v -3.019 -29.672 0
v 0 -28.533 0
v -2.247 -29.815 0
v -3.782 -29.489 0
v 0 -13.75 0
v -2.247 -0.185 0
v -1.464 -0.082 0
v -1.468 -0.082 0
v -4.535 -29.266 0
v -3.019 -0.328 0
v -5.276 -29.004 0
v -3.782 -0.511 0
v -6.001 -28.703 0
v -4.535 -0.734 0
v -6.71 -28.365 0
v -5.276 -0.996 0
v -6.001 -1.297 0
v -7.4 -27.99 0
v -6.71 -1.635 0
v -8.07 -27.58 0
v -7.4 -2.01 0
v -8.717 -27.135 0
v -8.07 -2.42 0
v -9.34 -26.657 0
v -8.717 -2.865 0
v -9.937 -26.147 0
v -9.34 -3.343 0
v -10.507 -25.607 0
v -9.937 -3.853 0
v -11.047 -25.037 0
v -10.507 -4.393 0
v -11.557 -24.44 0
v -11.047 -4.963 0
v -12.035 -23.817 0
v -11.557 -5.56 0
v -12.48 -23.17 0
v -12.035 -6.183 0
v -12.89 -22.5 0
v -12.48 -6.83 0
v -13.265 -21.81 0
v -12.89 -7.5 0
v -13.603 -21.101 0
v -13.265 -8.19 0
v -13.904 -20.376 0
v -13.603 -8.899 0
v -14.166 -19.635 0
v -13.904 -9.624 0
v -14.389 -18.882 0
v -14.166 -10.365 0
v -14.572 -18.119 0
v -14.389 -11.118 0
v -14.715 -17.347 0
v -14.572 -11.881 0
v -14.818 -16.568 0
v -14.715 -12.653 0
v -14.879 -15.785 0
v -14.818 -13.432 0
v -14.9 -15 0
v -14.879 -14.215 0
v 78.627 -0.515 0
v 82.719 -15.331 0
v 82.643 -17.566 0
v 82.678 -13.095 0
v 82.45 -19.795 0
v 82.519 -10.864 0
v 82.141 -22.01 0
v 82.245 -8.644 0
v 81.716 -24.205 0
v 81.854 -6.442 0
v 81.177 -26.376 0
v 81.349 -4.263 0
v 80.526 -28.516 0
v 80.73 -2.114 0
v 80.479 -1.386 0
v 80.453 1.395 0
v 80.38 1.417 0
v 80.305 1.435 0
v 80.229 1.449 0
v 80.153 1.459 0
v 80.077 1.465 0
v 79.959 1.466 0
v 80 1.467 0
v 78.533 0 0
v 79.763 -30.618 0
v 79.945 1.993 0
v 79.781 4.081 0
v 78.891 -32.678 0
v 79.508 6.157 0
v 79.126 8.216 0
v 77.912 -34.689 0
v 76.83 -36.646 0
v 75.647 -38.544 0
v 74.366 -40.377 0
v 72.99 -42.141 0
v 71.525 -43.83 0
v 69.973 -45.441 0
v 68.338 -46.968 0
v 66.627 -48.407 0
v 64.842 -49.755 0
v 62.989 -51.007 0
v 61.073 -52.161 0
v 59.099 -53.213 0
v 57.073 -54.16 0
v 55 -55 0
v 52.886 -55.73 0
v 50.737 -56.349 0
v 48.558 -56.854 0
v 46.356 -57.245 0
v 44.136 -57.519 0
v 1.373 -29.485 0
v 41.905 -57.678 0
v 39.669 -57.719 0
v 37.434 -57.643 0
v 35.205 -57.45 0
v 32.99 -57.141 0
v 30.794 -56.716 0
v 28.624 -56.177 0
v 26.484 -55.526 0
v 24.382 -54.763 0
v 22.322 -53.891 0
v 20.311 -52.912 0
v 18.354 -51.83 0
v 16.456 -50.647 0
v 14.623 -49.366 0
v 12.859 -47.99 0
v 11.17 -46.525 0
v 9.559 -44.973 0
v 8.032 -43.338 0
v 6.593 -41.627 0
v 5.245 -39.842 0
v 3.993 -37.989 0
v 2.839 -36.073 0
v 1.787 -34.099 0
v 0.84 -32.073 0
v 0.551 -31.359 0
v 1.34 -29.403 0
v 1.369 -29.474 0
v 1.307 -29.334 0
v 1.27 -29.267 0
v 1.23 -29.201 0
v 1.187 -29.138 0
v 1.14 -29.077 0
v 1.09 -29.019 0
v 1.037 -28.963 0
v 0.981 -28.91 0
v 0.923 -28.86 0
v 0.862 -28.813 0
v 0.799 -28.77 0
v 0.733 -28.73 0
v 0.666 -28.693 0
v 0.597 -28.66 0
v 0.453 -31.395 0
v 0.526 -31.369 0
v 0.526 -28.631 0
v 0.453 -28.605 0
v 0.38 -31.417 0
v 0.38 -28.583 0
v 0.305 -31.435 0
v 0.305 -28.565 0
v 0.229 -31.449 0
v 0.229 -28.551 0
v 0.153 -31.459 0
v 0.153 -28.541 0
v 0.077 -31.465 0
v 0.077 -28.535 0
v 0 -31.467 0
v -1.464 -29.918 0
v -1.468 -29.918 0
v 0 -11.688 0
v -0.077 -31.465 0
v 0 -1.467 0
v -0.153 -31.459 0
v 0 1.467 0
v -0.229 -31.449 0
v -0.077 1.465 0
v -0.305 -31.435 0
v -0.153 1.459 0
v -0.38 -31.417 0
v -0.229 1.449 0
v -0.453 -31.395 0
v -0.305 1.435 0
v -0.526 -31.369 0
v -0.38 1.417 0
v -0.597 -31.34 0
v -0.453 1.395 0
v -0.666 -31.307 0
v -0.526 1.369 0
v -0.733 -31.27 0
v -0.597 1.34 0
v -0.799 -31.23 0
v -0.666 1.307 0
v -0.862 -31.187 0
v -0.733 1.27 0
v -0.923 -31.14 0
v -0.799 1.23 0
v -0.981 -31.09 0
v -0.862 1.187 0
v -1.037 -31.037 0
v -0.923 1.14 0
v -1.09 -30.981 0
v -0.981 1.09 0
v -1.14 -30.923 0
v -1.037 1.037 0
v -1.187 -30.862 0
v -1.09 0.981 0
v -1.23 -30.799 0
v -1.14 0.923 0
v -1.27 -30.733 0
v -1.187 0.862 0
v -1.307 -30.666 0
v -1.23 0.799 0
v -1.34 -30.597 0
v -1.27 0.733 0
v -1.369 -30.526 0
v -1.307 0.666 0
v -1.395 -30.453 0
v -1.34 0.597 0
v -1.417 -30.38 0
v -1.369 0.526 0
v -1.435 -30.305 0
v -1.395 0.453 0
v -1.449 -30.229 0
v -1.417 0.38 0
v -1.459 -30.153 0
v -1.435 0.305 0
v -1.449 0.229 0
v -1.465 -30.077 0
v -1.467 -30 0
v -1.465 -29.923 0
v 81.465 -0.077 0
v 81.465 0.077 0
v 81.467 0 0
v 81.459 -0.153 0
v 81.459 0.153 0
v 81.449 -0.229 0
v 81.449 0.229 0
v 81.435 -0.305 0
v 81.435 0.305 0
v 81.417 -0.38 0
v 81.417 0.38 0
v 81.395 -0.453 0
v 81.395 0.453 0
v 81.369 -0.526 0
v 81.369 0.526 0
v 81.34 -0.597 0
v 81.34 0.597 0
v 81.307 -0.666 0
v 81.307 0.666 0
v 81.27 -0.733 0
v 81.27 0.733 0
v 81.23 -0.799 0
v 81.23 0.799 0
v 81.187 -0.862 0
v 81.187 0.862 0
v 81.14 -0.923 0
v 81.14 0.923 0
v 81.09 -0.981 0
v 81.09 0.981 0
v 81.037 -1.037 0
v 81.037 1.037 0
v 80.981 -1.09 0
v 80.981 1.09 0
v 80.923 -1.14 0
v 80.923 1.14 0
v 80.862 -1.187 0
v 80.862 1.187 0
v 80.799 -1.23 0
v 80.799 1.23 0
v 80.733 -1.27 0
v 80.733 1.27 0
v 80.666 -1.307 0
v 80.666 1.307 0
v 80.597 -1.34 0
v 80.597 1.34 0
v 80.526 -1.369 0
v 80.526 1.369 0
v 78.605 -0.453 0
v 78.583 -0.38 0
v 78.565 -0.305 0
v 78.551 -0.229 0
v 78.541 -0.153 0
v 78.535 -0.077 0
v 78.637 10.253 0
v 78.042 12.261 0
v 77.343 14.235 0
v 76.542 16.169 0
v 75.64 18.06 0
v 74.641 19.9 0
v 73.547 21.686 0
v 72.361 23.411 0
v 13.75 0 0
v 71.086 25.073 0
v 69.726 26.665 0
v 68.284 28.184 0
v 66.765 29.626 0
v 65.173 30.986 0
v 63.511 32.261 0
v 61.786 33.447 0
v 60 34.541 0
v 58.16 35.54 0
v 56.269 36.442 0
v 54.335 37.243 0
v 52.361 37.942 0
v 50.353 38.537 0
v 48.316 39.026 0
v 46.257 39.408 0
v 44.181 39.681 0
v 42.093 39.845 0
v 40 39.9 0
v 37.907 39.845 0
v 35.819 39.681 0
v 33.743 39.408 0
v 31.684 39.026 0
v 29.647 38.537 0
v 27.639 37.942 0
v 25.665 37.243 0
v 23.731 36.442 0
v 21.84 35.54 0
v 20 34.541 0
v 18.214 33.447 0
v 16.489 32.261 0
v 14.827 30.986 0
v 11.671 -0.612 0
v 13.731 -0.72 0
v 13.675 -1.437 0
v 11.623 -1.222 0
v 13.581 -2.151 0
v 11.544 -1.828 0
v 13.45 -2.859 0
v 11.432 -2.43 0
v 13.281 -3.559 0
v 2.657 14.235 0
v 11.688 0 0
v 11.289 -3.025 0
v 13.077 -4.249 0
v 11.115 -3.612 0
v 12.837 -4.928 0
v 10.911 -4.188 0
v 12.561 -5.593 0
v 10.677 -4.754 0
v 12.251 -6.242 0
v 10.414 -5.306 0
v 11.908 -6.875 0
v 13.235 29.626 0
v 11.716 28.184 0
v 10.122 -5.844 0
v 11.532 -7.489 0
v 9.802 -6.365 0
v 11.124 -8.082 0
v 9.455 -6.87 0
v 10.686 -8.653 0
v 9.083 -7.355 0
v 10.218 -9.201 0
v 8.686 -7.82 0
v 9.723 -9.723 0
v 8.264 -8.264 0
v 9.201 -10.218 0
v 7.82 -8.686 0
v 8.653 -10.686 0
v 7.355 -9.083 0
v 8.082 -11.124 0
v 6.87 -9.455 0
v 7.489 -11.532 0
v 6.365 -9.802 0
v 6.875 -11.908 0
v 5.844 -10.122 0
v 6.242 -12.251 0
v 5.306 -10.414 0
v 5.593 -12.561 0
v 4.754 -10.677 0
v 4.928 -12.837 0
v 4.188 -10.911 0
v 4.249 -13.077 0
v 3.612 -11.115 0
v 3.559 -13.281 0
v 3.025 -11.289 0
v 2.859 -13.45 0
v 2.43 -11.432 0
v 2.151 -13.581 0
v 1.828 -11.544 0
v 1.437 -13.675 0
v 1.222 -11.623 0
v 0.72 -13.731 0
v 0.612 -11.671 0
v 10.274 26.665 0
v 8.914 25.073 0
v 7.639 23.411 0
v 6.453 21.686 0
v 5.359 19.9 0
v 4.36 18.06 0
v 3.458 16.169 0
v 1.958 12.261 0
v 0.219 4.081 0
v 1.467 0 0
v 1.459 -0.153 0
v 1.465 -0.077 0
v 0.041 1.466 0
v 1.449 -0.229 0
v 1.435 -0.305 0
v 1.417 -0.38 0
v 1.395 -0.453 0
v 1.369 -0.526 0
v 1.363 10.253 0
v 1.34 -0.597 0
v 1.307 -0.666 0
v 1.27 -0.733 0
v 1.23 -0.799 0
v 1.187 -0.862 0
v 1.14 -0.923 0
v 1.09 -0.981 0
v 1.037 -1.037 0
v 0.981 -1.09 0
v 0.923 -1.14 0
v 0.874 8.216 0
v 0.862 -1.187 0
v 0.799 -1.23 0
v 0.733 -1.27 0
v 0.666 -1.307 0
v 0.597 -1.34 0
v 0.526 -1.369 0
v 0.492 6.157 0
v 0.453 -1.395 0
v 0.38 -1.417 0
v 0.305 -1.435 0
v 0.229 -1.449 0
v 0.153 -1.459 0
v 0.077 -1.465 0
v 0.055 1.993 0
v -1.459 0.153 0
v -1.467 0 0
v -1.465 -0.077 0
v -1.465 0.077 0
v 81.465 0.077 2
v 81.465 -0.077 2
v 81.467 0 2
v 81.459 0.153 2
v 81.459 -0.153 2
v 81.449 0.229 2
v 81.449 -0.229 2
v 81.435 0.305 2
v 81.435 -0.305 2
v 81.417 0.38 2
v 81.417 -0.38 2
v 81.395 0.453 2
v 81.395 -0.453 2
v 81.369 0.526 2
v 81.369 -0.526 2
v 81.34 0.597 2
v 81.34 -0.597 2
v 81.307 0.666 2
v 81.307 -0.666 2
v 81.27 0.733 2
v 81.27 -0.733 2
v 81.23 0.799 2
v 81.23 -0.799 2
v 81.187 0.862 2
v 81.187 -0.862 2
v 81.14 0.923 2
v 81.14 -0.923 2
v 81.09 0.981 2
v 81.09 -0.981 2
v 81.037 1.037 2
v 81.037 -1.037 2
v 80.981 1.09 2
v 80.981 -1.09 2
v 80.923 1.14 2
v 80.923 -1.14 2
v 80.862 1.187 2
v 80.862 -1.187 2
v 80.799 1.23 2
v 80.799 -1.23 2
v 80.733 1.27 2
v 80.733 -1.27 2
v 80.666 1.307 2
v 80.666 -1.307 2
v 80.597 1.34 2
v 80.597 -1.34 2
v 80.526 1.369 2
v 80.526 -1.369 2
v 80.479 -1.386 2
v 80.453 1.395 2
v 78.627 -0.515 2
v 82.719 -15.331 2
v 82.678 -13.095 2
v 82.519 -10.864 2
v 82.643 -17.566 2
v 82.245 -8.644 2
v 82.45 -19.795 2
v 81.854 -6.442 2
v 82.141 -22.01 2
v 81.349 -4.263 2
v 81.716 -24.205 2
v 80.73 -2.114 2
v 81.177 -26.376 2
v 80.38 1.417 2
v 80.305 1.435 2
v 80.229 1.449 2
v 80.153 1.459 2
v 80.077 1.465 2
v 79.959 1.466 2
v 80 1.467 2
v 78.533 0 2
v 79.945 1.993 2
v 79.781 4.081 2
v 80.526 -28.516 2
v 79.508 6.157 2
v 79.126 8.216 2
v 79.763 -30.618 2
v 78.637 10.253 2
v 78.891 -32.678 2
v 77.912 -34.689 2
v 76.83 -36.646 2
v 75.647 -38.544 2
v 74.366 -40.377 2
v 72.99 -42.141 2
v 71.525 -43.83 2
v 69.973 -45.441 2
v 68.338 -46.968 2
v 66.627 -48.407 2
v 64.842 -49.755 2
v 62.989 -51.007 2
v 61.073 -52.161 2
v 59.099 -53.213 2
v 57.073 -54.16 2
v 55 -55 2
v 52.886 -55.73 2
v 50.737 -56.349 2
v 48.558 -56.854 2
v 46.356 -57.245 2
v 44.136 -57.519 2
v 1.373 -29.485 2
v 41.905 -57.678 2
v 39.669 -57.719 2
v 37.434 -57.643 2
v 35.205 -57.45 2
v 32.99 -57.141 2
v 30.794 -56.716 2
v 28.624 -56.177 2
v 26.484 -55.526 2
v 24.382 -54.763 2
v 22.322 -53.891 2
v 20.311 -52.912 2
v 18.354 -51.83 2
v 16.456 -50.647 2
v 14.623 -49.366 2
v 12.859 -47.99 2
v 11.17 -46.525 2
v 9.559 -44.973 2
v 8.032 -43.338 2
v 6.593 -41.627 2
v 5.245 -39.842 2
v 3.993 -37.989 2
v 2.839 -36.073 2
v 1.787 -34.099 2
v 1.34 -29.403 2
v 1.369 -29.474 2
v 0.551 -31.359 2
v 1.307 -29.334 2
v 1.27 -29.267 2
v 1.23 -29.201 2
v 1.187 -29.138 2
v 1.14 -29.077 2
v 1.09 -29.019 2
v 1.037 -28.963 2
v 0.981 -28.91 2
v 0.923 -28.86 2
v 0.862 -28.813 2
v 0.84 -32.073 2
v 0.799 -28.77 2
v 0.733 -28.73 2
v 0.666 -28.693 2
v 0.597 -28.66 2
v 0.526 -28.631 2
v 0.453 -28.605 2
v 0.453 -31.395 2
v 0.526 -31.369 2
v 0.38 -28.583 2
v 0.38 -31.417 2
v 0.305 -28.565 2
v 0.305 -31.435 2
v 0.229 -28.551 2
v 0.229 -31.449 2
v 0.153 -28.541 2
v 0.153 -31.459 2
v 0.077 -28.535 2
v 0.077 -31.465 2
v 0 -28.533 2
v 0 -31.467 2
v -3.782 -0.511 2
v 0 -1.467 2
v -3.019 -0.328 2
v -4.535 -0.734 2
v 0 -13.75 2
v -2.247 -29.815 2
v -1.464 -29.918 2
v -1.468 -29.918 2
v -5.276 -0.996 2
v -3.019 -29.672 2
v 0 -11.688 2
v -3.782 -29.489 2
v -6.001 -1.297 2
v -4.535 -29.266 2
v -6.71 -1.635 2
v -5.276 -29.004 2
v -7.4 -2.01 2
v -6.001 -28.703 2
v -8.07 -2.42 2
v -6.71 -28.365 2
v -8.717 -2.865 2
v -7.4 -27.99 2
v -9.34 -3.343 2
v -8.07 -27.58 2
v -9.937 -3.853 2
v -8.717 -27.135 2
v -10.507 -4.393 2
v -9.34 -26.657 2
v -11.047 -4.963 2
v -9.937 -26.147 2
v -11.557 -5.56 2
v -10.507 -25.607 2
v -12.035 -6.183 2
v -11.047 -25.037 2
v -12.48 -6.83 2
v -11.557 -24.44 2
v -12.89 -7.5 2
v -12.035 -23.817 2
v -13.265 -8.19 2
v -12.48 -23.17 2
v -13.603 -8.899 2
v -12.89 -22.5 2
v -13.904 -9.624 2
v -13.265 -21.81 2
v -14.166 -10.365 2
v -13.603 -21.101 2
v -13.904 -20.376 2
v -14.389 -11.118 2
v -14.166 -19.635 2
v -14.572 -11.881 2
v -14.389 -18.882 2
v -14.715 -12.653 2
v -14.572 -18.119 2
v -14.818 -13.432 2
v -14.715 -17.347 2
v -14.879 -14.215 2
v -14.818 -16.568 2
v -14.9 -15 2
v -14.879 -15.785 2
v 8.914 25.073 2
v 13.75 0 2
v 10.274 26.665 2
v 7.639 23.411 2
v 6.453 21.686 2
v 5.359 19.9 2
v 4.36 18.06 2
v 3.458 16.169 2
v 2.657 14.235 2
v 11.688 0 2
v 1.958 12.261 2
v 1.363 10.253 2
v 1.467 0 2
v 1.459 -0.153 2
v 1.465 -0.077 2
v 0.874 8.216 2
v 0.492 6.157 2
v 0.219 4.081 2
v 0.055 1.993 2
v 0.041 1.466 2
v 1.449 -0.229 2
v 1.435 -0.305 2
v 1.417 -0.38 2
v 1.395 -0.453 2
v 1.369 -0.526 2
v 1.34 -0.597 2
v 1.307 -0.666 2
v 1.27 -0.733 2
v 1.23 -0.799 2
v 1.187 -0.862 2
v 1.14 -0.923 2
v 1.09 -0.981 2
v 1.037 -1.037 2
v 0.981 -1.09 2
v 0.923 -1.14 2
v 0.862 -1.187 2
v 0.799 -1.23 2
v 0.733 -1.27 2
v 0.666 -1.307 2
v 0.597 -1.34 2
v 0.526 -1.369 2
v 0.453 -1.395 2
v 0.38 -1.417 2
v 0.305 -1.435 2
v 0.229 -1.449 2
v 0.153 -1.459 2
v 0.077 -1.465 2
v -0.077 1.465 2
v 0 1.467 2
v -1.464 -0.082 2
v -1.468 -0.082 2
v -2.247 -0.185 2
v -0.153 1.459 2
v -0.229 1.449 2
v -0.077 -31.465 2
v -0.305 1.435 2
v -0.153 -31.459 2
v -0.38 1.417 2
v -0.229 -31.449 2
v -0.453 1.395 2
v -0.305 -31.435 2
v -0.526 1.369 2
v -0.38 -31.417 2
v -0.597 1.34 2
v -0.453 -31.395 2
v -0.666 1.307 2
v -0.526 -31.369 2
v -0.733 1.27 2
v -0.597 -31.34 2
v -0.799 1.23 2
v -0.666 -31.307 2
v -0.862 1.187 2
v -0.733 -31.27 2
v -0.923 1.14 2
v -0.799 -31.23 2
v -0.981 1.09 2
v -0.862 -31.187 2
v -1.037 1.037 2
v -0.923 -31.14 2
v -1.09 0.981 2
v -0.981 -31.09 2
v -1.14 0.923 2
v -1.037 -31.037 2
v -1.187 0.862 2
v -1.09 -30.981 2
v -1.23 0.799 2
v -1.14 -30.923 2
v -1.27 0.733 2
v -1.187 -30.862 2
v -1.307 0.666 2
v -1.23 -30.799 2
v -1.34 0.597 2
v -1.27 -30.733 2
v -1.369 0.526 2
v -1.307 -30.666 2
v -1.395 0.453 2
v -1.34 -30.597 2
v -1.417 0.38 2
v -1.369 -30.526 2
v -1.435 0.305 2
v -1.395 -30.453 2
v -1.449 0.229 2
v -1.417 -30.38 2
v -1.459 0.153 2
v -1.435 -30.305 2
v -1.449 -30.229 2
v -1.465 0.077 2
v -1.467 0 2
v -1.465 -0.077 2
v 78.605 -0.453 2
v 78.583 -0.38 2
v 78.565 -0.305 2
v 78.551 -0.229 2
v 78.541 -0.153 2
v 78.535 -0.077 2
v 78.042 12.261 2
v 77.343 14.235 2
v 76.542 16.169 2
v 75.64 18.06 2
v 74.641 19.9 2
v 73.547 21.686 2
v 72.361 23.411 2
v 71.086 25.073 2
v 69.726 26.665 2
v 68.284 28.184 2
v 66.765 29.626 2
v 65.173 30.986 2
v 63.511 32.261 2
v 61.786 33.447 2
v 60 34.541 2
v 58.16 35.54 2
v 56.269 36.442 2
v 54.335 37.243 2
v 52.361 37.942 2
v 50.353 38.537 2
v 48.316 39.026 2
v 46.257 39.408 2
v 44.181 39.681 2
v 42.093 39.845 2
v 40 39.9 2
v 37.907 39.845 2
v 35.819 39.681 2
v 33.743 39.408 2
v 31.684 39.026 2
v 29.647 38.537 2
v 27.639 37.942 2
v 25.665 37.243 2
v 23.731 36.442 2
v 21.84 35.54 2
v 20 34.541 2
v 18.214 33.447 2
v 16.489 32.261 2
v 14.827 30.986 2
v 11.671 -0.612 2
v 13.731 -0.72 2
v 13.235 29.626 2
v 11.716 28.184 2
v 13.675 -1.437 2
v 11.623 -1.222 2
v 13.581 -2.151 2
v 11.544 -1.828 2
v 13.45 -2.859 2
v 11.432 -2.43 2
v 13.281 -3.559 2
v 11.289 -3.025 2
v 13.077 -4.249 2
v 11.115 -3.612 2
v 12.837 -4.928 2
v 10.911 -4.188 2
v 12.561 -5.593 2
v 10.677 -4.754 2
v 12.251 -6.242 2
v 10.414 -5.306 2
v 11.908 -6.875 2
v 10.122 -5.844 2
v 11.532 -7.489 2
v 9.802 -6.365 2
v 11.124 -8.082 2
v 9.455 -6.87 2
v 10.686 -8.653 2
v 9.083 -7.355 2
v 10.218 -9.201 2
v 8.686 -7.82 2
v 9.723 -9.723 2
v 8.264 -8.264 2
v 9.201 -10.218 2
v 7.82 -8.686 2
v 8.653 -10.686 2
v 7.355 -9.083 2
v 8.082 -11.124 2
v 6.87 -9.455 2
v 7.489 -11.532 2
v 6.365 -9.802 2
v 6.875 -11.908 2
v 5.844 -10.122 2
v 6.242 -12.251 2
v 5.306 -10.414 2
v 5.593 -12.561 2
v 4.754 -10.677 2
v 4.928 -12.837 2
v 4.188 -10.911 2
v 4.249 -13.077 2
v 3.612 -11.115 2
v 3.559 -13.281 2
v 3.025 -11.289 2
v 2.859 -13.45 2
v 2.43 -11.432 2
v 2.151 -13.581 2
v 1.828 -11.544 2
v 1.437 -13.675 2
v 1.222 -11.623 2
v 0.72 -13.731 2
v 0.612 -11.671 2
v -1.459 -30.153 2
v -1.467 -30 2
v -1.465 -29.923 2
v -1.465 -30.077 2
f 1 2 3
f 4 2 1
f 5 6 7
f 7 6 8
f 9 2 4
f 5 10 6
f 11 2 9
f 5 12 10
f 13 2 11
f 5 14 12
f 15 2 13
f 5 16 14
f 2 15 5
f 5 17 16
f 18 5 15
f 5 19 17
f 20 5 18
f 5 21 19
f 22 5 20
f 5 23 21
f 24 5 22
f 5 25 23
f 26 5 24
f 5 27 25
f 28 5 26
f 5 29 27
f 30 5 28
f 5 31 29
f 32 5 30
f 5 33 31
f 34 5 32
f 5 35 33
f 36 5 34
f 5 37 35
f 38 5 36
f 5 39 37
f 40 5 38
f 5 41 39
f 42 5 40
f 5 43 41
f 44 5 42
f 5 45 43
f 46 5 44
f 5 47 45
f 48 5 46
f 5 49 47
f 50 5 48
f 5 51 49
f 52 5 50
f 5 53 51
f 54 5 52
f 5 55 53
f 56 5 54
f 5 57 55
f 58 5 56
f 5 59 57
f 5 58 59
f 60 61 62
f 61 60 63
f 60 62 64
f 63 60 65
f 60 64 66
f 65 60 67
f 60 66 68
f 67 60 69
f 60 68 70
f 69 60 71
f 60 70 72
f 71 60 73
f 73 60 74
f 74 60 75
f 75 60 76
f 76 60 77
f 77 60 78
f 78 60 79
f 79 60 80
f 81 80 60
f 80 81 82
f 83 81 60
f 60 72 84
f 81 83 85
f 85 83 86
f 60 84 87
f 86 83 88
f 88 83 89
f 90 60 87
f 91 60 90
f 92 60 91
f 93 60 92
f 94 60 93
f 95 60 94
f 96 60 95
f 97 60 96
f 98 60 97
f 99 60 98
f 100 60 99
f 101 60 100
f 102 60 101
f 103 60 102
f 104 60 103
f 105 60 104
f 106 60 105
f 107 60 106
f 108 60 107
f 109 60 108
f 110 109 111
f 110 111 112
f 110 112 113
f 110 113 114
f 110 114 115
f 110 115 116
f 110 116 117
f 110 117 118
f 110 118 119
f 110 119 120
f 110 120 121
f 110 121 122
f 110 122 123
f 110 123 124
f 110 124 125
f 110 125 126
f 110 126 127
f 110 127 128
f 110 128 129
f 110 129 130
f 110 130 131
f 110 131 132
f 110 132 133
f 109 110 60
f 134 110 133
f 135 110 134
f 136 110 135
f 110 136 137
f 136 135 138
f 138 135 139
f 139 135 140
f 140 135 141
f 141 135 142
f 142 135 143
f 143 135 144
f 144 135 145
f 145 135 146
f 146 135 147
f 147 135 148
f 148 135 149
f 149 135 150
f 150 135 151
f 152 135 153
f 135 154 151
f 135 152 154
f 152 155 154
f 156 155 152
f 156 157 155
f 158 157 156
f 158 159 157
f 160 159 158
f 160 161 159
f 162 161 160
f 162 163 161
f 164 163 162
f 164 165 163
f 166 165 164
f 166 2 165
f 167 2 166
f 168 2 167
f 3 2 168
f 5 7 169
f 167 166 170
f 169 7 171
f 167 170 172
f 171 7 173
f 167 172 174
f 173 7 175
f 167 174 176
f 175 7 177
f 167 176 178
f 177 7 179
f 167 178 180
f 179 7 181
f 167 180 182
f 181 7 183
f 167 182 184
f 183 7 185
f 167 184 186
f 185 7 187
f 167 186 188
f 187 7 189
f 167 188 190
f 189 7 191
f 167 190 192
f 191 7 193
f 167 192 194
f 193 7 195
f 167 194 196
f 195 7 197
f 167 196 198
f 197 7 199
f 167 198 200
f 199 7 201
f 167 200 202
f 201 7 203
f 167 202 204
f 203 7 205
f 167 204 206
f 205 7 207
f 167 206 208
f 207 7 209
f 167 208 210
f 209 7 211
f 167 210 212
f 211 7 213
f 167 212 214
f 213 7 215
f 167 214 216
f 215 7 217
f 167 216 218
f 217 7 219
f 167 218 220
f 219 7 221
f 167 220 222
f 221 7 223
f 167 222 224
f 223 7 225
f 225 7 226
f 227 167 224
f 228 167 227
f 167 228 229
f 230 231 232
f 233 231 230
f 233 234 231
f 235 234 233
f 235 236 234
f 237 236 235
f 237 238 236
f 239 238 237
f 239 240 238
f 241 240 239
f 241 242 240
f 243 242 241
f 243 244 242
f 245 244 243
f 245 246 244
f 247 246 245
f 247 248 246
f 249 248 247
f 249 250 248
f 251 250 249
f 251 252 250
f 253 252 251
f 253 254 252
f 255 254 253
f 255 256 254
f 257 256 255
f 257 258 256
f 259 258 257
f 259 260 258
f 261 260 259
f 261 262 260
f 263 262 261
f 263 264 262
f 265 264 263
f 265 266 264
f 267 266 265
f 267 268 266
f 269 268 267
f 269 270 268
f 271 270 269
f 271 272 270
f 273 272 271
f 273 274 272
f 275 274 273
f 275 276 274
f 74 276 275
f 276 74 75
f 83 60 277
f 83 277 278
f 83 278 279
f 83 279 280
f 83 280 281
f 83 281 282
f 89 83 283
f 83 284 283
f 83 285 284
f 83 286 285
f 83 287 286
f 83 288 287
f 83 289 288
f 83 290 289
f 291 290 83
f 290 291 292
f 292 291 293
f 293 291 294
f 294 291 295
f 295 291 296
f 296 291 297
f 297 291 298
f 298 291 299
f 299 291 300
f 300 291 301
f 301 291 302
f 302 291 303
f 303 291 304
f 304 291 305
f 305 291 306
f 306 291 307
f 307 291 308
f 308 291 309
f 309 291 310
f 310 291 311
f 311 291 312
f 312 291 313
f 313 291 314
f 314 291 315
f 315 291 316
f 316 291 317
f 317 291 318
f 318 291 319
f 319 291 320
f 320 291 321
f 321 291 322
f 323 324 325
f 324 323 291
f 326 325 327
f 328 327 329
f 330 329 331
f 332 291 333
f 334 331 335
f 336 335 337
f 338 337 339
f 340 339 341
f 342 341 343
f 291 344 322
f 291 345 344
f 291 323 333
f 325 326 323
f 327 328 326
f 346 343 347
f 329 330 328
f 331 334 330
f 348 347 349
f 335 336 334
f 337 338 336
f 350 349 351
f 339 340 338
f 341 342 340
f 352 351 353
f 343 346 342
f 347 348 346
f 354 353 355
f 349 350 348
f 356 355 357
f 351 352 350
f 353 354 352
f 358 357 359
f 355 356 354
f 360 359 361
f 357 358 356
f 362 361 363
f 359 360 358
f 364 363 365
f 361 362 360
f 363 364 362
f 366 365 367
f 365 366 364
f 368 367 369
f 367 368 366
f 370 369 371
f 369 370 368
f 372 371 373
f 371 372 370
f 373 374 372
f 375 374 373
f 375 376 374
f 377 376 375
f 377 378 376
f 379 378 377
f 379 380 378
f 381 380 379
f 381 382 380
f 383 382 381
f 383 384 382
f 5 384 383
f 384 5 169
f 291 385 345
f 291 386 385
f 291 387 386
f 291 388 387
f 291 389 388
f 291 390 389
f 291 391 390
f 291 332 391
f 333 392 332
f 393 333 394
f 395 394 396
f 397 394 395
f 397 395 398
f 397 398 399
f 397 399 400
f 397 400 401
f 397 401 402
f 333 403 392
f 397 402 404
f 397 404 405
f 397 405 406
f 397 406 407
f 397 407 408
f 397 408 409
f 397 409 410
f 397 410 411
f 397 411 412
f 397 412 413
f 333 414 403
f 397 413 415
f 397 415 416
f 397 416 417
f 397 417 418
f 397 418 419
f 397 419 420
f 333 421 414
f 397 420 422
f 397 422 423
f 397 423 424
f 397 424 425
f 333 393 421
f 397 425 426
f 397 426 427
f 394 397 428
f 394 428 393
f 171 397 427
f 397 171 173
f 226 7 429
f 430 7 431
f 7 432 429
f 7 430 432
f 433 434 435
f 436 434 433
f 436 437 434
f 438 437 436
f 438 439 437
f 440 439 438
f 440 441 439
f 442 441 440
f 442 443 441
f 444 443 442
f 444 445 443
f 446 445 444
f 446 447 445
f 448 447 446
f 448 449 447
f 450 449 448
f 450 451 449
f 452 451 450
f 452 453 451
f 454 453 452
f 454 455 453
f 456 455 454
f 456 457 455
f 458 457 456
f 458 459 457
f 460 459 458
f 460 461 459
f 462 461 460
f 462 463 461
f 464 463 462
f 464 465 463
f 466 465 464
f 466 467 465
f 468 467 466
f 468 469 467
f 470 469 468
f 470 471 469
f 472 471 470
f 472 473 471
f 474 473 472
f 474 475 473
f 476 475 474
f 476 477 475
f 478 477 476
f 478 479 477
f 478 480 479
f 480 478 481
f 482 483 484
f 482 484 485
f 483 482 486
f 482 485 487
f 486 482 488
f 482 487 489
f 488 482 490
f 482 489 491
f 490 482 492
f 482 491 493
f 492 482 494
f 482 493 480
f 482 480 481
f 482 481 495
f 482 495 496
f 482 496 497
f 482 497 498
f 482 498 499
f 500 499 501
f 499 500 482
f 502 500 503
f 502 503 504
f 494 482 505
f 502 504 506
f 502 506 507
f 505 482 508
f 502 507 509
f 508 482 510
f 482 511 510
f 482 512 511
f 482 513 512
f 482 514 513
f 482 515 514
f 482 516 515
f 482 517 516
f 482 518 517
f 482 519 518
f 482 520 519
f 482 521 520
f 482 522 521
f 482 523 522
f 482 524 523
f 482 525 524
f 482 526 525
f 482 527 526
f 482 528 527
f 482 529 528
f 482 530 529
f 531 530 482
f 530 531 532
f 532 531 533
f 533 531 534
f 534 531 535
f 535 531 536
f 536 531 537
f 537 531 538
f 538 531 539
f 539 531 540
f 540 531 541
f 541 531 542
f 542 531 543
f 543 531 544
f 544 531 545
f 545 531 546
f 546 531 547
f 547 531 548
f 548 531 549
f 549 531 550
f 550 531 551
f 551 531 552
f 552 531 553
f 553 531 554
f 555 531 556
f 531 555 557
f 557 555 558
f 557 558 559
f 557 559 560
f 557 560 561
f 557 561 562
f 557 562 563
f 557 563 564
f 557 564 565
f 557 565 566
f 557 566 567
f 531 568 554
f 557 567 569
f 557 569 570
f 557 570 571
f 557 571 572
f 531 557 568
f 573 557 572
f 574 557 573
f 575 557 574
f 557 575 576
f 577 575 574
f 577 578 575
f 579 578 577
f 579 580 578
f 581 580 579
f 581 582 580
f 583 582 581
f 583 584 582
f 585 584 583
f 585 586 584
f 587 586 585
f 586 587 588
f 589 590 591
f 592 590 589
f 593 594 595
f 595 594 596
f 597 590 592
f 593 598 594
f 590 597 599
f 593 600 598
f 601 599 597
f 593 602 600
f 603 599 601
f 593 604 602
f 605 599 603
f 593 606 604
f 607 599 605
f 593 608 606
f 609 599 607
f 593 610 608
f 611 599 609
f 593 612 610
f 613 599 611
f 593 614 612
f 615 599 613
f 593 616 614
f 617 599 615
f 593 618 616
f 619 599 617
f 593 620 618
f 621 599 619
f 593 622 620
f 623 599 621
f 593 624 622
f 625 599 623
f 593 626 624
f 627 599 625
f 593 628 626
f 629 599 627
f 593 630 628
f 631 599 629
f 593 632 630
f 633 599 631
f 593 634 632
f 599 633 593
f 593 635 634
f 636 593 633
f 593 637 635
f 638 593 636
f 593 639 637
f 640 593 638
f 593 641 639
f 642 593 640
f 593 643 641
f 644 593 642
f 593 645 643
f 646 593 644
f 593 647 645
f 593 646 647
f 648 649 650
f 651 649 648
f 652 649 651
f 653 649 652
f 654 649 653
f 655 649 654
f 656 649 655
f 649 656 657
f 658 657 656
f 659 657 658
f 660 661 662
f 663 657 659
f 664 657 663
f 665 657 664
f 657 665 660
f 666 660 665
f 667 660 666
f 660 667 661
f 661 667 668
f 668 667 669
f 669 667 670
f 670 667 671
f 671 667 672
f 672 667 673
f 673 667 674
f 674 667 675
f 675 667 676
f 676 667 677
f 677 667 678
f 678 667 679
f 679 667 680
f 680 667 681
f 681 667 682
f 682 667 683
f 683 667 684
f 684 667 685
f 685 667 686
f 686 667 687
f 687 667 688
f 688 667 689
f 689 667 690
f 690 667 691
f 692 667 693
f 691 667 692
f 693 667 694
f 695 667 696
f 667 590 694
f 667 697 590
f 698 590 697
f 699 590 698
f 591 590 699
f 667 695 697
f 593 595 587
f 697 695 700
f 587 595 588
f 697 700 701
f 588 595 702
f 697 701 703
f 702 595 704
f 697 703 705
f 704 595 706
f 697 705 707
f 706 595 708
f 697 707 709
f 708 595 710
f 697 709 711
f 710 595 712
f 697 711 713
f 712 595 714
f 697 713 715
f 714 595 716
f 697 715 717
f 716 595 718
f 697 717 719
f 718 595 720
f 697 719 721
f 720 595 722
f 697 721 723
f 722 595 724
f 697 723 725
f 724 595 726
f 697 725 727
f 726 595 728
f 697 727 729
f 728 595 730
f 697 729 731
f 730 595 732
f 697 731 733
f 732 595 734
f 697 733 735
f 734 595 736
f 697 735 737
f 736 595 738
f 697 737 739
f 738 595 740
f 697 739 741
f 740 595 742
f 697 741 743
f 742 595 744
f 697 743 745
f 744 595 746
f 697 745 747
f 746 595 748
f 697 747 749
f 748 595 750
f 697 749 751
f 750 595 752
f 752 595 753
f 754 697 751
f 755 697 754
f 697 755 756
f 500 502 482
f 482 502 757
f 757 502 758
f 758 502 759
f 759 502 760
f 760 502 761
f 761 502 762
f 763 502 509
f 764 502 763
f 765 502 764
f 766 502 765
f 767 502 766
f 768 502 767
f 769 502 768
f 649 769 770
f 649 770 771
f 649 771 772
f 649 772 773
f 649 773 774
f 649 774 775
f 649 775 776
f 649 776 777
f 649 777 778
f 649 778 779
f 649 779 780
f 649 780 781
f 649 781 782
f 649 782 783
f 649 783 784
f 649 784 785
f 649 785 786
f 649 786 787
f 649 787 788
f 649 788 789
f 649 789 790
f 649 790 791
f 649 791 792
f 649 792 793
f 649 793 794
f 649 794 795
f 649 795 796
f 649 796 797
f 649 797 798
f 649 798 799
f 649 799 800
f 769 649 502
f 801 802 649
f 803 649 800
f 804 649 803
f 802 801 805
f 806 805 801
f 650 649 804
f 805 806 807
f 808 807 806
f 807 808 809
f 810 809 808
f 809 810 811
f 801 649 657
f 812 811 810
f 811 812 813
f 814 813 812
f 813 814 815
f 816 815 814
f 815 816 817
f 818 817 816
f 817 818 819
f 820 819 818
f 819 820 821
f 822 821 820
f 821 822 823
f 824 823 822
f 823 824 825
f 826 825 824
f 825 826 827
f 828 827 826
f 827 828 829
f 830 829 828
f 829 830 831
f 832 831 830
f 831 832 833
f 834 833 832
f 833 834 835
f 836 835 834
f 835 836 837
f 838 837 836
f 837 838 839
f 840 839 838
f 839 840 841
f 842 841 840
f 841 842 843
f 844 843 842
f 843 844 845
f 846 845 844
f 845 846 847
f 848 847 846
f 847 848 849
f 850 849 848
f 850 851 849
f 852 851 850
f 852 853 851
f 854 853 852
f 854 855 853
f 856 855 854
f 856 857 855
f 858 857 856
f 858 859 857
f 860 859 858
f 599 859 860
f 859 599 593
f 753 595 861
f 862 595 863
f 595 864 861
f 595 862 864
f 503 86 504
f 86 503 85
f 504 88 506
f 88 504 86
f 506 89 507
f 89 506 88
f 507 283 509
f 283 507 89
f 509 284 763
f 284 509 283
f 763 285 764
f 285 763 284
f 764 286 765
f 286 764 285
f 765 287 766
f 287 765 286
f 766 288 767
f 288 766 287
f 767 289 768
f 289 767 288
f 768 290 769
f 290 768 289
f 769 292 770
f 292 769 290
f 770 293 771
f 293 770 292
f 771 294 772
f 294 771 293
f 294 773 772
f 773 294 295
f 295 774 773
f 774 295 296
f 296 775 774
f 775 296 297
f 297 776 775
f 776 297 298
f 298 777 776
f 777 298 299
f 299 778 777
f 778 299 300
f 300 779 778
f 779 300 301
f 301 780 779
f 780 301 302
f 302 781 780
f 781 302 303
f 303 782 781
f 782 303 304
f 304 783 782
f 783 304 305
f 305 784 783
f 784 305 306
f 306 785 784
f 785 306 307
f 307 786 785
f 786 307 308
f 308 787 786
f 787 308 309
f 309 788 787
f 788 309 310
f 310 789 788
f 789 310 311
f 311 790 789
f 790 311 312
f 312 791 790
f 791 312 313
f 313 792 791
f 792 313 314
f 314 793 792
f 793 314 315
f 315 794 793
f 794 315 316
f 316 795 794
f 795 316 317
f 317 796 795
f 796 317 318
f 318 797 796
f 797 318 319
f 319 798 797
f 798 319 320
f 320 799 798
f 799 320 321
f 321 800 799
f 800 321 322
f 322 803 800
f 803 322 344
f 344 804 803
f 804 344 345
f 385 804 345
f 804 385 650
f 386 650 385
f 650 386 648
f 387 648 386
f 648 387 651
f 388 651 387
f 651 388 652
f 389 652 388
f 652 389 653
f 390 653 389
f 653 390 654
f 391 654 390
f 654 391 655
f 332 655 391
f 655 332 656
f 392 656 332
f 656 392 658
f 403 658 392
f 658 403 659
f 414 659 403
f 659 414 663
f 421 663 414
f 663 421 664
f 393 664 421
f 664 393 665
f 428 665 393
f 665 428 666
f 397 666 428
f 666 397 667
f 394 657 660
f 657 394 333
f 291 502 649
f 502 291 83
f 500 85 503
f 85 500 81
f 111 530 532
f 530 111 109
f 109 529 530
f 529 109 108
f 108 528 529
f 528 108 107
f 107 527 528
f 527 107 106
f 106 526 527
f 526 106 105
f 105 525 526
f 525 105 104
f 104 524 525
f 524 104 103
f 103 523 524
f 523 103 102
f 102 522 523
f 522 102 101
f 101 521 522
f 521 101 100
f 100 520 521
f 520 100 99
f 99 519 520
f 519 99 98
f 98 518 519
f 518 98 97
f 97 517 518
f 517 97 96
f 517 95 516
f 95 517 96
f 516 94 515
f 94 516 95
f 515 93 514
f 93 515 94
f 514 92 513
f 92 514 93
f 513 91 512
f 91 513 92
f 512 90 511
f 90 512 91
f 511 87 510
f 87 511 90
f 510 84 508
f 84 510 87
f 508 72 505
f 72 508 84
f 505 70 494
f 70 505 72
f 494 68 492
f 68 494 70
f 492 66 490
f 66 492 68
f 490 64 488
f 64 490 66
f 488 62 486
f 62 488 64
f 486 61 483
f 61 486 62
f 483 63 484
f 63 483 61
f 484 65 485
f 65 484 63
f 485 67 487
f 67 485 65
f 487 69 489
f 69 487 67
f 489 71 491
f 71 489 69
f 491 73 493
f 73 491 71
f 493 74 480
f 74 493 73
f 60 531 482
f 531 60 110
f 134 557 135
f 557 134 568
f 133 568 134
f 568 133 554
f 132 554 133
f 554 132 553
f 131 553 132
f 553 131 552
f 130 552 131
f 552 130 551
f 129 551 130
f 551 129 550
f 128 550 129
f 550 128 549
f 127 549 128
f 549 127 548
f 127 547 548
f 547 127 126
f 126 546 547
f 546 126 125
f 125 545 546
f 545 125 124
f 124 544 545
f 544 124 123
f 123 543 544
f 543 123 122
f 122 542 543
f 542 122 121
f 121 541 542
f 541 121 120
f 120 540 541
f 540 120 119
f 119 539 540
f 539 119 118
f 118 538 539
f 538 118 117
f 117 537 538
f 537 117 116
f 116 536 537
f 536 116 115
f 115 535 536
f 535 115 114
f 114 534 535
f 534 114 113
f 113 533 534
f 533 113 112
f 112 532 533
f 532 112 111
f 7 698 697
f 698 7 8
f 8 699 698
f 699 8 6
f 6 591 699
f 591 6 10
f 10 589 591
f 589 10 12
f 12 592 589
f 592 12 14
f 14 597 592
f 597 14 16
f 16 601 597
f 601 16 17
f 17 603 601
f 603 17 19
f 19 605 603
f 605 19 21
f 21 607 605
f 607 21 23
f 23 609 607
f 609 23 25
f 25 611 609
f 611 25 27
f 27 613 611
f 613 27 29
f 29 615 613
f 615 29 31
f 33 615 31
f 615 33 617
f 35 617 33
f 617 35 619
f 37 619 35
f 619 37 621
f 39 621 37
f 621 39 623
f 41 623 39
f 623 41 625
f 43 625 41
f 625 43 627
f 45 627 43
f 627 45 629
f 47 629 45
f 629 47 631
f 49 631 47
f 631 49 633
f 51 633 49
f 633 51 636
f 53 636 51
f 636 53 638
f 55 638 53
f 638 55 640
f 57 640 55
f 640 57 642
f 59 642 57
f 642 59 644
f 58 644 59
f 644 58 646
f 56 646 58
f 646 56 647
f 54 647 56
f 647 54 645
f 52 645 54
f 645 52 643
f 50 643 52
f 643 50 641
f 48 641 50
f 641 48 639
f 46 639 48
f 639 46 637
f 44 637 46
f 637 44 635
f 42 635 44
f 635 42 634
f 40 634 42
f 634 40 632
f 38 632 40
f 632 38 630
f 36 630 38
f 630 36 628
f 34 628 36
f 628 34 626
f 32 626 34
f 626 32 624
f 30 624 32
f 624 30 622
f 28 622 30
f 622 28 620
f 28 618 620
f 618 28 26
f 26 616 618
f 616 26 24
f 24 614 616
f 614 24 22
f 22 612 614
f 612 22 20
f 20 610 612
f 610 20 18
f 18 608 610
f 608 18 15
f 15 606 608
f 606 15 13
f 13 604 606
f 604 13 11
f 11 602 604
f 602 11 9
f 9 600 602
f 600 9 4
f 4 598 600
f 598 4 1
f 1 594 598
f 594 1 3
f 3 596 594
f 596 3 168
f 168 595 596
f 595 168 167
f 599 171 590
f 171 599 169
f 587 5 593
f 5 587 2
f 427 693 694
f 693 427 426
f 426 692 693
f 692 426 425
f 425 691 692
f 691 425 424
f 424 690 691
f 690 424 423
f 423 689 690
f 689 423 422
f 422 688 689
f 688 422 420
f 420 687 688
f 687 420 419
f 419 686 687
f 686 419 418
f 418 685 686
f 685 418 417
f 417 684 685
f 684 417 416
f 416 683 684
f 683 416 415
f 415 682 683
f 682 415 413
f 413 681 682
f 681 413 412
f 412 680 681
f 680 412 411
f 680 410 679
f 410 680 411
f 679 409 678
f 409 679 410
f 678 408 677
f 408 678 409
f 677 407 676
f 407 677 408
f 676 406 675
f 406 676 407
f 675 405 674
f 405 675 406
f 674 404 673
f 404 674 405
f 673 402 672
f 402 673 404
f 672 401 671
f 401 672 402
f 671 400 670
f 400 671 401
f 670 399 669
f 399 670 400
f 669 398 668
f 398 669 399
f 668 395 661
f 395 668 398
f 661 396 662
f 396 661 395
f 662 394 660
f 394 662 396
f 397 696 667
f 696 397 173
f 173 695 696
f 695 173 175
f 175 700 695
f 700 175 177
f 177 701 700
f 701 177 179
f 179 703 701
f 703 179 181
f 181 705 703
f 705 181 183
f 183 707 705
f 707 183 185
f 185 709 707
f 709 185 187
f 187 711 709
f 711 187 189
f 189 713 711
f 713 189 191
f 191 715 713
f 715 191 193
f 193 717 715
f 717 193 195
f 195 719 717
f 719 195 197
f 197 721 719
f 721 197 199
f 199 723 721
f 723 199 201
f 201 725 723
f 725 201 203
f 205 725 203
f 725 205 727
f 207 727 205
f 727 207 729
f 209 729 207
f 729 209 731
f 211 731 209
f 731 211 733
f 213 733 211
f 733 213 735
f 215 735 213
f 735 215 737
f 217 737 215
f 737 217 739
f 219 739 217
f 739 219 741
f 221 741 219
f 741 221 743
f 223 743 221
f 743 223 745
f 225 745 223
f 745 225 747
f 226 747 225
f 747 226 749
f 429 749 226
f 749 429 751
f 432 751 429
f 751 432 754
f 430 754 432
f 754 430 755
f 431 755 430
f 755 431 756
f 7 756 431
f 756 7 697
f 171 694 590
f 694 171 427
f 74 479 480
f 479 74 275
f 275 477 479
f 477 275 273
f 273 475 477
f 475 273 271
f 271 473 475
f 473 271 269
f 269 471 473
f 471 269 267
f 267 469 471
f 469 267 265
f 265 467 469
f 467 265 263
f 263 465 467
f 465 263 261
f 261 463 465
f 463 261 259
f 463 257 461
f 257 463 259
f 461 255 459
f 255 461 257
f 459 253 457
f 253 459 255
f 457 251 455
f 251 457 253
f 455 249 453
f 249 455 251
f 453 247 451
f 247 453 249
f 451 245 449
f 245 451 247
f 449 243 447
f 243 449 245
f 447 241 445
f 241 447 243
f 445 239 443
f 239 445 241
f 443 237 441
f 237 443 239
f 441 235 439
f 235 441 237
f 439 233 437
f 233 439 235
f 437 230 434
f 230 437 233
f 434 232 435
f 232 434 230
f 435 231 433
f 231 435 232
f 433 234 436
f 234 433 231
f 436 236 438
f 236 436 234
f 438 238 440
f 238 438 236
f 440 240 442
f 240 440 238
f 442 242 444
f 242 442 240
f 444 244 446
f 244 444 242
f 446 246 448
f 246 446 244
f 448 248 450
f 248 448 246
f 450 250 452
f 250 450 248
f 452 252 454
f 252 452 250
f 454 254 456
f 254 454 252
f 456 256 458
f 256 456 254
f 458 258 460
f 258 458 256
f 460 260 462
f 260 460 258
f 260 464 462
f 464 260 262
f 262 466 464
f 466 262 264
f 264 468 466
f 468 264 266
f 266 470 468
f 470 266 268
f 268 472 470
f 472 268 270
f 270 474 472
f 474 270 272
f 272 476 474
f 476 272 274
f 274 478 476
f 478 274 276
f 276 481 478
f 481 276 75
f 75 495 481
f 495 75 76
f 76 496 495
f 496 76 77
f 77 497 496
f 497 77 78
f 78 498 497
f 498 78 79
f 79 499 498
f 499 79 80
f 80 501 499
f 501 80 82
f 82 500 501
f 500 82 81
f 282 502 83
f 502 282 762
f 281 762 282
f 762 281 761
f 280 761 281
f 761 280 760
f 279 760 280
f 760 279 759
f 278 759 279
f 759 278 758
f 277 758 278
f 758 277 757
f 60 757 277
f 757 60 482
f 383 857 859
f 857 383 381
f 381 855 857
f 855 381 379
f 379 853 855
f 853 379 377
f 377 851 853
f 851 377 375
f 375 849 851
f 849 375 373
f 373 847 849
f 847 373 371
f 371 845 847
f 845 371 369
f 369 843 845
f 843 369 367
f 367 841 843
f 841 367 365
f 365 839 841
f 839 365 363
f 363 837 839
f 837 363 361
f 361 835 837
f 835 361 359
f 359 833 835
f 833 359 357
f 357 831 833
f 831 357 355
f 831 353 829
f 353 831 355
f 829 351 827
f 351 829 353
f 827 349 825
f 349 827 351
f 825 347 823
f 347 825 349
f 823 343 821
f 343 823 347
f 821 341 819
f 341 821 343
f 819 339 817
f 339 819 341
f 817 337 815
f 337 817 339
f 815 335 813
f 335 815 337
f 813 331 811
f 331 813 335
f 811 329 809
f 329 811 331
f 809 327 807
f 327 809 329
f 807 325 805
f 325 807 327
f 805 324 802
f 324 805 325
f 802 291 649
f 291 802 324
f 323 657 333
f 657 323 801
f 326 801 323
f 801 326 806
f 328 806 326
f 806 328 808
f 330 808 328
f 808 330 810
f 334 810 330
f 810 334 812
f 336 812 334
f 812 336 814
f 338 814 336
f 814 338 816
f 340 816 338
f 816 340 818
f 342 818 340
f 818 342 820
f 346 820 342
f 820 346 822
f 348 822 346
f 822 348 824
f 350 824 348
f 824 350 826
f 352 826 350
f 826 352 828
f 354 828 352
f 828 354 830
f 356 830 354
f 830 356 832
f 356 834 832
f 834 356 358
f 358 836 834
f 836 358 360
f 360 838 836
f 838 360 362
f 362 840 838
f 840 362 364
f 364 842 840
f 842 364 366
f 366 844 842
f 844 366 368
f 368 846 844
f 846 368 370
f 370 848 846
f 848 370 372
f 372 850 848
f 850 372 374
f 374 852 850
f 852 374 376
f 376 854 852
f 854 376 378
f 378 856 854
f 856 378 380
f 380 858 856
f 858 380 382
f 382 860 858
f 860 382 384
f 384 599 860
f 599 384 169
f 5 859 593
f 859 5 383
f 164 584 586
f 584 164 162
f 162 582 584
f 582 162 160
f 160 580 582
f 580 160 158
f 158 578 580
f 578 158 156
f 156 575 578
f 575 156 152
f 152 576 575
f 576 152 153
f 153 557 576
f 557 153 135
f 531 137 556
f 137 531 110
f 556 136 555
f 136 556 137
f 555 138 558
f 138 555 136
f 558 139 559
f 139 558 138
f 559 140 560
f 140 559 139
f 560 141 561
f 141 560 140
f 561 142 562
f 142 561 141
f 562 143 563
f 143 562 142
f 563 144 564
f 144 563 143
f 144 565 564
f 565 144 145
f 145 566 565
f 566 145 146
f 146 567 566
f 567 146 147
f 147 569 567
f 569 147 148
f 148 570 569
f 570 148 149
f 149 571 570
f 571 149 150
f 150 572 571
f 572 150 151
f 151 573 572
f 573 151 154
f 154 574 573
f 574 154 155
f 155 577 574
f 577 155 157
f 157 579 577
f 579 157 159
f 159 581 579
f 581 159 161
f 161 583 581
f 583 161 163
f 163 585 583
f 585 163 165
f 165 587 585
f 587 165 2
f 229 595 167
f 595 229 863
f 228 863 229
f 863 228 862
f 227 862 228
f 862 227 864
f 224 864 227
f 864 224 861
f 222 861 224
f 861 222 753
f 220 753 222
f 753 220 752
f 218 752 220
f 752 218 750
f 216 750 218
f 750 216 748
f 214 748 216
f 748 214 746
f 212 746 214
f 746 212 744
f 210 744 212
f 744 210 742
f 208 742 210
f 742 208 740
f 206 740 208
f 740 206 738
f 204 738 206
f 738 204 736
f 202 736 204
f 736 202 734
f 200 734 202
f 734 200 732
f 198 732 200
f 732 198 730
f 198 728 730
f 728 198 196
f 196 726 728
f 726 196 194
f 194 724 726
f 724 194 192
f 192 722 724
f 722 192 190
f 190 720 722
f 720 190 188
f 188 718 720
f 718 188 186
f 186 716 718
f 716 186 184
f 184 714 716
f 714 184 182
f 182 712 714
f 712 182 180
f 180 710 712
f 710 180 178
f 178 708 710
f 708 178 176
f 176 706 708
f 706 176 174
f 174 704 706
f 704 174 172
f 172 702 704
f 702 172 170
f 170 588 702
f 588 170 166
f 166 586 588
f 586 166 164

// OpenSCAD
// Pythagoras Thing
// Version 1.0
// Luigi Cisana, 22 Jan, 2014

// Leg a
leg_a=80; // [20:120]
// Leq b
leg_b=30; // [20:120]
// Height
heigth = 2; // [1:120]

// Number of facets, set a low value for a draft version
fn = 120; // [30:200]

/* [Hidden] */
a = leg_a;
b = leg_b;
c = sqrt(pow(a,2)+pow(b,2));
h = heigth;
ro = (a+b)/8;
e = (a+b)/75;

echo("c =", c, "ro =", ro, "e =", e);

/****** Main *********/
linear_extrude(height=h , center = false, convexity = 10, twist = 0) {
	semi_circles_a();
	semi_circles_b();
	semi_circles_c();
}

triangle();

//translate ([-3,3]) cylinder(h = 5.5, r=1, $fn=fn);

/****** Modules *********/

module semi_circles_a () {
	difference () {
		translate ([a/2,-0.1]) circle(r = a/2,$fn=fn);
		translate ([0,-a]) square ([a,a], center=false);
	}
} 

module semi_circles_b () {
	difference () {
		translate ([0.1,-b/2]) circle(r = b/2,$fn=fn);
		translate ([0,-b]) square ([b,b], center=false);
	}
}

module semi_circles_c () {
	translate ([0,-b]) {
		rotate(a=[0,0,asin(b/c)]) {
			difference () {
				translate ([c/2,0]) circle(r = c/2,$fn=fn);
				translate ([0,0]) square ([c,c], center=false);
			}
		}
	}
}

module triangle() {
	linear_extrude(height=h , center = false, convexity = 10, twist = 0) {
		difference () {
			circle(r = ro, $fn=fn);
			circle(r = ro*0.85, $fn=fn);
			translate ([-ro,0]) square ([2*ro,ro], center=false);
			translate ([-ro,-2*ro]) square ([ro,2*ro], center=false);	
		}
		
		translate ([0,0]) circle( r = e, $fn=fn);
		translate ([a,0]) circle( r = e, $fn=fn);
		translate ([0,-b]) circle( r = e, $fn=fn);
	}
}
